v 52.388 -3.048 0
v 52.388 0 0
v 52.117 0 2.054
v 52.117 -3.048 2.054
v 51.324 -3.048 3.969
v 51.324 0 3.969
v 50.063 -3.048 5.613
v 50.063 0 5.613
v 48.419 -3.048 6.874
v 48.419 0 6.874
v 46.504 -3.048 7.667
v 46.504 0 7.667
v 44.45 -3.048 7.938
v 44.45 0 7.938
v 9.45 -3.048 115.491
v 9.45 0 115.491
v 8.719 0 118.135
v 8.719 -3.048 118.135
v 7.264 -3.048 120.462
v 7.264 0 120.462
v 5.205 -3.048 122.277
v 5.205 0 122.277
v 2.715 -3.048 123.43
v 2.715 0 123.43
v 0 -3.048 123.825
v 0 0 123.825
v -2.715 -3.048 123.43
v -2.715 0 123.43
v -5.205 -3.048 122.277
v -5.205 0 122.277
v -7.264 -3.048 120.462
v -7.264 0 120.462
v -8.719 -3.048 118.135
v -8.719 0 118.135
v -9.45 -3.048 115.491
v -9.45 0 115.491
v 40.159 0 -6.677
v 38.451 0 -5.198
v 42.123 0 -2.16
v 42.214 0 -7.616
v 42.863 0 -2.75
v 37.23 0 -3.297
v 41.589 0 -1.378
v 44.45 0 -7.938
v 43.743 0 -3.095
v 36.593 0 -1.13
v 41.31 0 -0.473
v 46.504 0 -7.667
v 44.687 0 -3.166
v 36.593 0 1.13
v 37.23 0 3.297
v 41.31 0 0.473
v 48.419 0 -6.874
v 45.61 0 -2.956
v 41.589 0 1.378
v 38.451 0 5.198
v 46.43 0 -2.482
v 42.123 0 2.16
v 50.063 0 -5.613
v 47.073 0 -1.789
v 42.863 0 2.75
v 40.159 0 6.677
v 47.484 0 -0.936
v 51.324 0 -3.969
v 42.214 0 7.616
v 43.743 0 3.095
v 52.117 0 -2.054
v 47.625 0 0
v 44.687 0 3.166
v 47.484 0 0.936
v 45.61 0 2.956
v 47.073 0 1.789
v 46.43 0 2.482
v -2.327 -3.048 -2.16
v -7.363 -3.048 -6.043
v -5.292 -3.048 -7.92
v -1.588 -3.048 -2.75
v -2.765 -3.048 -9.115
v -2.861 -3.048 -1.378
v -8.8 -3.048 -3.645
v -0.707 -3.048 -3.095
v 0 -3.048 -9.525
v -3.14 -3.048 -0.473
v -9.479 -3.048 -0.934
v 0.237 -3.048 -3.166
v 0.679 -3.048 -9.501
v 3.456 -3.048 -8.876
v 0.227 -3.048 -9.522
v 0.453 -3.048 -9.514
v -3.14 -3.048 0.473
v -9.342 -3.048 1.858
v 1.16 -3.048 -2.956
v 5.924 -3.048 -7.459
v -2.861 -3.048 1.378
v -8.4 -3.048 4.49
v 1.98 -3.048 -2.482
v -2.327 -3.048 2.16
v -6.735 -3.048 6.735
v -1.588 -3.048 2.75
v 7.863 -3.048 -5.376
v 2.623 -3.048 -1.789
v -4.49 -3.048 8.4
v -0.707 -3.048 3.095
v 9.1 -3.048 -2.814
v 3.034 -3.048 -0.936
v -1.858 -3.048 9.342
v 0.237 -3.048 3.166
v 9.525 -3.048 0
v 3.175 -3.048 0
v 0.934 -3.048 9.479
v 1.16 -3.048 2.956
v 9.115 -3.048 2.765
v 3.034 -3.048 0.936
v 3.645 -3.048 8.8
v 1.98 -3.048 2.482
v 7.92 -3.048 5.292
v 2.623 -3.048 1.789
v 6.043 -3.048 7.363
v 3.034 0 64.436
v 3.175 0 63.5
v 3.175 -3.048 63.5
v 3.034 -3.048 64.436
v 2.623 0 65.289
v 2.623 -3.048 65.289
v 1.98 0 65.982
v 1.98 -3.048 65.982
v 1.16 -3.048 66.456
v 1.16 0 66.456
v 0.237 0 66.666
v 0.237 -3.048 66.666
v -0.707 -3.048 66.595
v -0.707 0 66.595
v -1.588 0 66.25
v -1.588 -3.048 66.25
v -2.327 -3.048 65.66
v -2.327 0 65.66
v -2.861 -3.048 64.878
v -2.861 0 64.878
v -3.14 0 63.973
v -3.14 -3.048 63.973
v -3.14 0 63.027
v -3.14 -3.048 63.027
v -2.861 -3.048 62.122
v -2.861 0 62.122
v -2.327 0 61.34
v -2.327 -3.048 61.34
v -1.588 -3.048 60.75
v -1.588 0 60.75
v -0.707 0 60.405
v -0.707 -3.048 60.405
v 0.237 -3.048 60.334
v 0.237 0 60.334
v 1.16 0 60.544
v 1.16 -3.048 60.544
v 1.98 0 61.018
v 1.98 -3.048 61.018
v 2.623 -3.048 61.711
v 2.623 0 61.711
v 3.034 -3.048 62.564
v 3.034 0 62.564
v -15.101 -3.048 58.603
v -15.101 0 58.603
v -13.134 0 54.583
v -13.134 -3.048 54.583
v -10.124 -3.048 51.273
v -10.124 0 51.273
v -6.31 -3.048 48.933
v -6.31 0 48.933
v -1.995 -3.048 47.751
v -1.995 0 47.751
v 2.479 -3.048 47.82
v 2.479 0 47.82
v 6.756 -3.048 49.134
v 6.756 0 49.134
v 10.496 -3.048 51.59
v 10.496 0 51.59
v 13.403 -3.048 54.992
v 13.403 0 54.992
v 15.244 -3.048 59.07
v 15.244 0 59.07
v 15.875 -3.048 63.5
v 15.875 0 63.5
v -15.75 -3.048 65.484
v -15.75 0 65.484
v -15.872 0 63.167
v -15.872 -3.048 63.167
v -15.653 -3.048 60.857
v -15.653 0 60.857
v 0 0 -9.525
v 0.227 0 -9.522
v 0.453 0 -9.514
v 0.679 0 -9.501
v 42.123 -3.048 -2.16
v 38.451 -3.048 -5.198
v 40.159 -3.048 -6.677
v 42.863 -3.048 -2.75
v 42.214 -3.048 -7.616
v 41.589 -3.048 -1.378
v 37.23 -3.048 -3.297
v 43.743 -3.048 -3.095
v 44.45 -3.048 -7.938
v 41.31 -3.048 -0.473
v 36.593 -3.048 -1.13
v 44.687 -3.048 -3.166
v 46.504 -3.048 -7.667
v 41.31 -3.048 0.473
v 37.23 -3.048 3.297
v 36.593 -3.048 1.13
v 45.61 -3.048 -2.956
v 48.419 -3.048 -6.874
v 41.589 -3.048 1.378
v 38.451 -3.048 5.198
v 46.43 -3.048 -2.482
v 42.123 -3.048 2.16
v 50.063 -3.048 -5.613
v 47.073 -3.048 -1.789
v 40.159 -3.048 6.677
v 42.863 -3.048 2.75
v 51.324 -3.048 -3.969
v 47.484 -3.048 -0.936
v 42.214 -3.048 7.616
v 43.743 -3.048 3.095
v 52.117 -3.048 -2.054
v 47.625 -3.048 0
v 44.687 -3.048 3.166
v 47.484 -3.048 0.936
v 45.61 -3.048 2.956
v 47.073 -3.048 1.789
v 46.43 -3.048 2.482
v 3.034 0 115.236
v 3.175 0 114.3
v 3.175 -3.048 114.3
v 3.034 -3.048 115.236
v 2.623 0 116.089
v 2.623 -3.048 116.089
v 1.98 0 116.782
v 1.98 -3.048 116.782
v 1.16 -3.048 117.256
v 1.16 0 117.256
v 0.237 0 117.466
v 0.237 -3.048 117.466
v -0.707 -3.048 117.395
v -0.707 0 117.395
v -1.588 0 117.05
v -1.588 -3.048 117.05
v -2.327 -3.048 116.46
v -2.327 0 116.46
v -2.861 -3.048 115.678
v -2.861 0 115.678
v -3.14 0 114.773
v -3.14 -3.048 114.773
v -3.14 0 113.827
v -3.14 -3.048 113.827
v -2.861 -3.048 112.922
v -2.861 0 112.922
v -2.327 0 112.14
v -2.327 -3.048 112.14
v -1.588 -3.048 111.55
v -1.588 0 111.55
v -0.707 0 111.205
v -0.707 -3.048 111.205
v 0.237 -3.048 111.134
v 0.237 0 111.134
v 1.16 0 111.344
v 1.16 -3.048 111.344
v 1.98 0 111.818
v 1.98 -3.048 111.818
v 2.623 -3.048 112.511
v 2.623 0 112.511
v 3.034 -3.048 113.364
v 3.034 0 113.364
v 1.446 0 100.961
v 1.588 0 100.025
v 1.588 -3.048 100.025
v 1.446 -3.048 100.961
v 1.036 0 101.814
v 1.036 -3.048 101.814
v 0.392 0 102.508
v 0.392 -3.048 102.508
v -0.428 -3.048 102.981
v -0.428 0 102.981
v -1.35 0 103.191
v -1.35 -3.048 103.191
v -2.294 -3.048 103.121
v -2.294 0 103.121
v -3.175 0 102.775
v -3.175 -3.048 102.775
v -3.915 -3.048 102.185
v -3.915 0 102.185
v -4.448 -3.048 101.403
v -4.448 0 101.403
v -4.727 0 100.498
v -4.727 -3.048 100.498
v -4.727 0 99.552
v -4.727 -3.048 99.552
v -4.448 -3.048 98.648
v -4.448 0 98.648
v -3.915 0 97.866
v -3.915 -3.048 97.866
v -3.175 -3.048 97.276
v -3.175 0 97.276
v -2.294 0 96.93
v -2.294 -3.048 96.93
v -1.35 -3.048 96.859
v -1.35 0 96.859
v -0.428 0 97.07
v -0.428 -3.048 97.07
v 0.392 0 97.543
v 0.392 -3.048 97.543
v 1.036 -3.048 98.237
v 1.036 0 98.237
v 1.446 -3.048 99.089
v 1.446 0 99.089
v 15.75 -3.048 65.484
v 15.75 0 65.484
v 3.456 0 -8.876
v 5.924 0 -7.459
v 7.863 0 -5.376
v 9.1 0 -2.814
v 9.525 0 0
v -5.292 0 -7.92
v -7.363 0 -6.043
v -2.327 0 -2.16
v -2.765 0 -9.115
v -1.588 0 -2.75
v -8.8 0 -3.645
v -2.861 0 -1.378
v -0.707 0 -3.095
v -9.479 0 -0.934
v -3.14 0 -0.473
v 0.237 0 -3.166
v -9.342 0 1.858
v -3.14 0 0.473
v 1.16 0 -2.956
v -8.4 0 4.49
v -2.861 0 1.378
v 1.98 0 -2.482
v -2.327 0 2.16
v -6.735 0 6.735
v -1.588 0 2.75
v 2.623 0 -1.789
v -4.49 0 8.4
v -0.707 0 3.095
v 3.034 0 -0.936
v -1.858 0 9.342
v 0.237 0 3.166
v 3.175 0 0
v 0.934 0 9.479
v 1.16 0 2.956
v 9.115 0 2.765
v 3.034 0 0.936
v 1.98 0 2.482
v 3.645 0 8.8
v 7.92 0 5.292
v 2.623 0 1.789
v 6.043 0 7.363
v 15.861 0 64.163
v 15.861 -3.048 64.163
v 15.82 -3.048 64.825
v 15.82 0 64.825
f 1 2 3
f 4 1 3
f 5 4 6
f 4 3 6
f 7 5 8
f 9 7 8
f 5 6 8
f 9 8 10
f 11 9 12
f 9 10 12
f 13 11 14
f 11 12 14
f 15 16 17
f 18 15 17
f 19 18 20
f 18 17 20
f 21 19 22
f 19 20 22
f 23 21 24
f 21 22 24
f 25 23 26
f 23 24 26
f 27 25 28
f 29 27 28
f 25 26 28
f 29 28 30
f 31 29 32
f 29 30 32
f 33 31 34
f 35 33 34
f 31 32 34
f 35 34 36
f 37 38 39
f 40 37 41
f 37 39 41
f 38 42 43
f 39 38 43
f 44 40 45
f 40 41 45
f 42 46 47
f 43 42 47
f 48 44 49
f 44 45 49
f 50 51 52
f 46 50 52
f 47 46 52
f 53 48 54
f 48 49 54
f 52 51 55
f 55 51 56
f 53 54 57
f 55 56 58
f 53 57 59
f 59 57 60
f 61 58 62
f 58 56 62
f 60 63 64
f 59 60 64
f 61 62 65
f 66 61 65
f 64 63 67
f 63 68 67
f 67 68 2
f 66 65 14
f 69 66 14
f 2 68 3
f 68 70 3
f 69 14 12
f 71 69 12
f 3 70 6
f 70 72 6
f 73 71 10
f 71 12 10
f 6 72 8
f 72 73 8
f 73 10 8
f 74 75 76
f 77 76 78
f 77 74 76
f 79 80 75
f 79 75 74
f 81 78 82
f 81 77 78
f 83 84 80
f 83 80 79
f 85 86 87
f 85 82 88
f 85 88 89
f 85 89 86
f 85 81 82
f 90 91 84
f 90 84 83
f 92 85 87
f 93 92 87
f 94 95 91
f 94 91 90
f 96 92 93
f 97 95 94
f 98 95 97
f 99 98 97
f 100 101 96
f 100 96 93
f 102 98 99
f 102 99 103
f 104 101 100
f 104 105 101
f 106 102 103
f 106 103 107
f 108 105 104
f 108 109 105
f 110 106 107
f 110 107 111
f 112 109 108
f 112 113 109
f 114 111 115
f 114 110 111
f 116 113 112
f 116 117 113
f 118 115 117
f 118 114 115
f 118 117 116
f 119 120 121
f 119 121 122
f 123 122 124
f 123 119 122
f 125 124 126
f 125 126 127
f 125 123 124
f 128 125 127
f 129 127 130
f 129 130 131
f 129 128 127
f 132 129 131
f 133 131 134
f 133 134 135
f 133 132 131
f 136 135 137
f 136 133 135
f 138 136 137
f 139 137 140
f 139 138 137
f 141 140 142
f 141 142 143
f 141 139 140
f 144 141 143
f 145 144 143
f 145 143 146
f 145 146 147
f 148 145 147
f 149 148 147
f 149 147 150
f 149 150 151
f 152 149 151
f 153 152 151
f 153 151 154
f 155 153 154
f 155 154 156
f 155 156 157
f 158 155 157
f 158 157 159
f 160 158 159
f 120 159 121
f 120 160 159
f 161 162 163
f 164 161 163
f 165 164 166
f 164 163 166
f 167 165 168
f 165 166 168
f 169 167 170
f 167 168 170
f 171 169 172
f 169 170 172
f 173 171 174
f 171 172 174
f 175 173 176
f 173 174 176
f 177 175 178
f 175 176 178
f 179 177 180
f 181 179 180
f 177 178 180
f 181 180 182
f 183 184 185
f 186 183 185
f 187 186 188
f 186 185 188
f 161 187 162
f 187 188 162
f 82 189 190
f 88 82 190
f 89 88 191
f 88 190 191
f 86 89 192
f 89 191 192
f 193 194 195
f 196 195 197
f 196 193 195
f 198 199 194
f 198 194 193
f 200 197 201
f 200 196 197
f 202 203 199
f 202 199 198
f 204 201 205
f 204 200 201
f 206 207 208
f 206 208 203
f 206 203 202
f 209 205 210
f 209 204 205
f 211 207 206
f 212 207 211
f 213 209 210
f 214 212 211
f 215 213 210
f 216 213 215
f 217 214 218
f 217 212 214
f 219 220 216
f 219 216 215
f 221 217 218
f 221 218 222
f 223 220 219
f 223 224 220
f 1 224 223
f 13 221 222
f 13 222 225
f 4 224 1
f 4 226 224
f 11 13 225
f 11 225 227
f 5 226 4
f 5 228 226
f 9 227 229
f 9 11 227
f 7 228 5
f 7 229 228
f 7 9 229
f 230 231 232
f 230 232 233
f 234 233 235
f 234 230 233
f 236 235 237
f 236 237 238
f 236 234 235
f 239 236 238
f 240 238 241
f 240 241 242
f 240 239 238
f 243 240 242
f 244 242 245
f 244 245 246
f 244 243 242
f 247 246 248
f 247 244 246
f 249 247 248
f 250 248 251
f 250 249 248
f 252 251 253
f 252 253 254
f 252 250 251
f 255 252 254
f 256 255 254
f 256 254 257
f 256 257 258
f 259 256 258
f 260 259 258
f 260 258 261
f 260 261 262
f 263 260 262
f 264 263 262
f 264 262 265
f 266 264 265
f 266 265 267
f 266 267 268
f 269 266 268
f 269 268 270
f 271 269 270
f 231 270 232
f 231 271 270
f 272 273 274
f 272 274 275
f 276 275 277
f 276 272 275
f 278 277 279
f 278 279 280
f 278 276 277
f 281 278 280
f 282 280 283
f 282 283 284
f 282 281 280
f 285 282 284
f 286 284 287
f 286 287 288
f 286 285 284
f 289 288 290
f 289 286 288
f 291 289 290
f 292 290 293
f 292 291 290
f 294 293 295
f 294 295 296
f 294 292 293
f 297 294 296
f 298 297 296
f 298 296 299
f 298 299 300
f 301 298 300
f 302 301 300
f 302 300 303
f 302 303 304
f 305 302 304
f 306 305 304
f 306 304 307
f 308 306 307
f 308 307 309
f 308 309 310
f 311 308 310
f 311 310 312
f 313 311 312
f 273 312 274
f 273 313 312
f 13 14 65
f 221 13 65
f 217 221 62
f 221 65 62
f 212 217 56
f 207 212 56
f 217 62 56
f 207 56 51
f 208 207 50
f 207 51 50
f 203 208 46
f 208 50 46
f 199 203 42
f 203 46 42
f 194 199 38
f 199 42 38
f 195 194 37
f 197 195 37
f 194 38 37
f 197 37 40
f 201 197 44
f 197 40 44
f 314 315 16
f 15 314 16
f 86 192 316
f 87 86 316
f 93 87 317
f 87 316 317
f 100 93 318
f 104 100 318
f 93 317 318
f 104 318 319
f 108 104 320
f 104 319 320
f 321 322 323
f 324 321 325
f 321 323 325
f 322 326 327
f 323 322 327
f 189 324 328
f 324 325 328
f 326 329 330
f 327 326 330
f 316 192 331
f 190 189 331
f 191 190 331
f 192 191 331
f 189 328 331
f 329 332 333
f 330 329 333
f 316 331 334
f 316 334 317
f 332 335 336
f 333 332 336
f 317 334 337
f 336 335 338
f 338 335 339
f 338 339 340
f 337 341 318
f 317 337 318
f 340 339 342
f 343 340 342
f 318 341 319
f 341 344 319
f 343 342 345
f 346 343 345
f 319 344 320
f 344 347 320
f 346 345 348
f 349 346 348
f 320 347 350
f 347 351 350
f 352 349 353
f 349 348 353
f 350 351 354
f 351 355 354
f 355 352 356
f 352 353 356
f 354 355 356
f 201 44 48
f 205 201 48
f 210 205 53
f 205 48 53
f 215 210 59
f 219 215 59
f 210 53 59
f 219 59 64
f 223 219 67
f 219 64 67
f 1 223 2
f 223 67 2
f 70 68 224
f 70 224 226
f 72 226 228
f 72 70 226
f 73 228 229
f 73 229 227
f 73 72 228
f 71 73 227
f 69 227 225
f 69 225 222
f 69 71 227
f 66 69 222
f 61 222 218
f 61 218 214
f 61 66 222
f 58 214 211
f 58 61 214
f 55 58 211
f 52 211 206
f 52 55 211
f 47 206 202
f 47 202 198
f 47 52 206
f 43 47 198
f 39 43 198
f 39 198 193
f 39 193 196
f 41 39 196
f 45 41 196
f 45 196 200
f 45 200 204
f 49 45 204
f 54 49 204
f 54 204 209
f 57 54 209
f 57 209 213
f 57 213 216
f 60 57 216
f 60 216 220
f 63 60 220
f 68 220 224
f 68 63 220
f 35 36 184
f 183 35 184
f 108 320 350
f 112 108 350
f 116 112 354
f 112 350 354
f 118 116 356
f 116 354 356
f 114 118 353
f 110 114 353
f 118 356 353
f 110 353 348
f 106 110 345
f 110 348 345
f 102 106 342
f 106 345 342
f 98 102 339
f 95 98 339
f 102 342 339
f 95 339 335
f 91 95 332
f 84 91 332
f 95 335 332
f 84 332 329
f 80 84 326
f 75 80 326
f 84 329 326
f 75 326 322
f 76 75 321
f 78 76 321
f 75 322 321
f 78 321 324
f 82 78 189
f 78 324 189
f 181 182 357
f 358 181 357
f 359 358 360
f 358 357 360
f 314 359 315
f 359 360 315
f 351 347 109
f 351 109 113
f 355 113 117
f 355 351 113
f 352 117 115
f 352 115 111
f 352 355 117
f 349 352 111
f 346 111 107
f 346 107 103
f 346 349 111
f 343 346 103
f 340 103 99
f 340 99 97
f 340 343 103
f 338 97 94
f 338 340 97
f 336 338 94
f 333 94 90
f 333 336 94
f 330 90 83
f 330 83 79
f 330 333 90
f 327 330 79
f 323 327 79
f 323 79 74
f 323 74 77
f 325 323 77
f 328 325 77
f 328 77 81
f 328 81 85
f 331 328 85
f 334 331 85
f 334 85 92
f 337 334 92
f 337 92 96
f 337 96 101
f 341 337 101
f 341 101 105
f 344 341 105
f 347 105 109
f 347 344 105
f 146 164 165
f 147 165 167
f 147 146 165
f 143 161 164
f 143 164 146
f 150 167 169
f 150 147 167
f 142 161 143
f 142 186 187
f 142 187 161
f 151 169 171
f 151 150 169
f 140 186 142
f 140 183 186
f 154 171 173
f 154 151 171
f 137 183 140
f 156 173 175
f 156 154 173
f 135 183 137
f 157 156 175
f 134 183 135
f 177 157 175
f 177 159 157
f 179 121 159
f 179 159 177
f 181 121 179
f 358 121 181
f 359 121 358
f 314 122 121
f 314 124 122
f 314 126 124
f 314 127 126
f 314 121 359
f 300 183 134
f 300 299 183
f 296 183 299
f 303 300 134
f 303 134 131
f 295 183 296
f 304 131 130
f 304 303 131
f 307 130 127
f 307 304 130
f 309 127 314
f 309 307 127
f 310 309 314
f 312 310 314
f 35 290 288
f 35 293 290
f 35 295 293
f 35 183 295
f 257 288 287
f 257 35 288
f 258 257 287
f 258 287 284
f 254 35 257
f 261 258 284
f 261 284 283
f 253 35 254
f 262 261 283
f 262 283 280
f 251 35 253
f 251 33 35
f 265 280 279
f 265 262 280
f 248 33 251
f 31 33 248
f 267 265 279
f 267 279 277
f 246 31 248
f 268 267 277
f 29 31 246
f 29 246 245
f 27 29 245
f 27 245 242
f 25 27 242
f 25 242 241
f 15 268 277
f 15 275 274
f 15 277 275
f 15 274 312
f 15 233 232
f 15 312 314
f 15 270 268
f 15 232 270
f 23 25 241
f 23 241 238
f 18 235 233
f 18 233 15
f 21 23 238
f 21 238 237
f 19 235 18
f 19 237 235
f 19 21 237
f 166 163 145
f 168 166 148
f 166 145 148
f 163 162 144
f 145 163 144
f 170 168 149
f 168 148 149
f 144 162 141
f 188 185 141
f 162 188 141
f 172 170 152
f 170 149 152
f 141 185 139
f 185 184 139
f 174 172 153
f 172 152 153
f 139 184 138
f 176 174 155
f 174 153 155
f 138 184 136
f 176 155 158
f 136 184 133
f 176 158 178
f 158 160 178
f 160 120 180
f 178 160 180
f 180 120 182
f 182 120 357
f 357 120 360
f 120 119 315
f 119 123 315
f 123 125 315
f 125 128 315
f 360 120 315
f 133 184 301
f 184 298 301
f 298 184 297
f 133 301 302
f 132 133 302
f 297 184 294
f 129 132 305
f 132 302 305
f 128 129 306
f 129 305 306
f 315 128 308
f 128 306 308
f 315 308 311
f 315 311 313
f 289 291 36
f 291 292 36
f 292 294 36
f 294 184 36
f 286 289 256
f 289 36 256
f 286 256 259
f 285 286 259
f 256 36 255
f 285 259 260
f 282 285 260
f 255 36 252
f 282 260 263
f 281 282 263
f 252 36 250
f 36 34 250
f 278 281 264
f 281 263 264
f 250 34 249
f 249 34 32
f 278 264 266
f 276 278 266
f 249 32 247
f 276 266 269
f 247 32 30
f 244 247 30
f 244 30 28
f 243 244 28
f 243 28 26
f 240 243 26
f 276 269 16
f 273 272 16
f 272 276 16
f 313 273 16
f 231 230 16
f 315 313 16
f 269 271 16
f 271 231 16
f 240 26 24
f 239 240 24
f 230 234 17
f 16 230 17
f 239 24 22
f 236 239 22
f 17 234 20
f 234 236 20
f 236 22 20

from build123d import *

# Parameters (mm, degrees)
F0_R     = 3.175
F1_DEPTH = 3.048


with BuildPart() as f1:
    # F0 (on Front) → F1 (new body)
    with BuildSketch(Plane.XZ):
        with BuildLine():
            ThreePointArc((0.67949, -9.500732), (6.97129, -6.490511), (9.525, 0))
            ThreePointArc((9.525, 0), (-6.735192, 6.735192), (0, -9.525))
            Line((0, -9.525), (0.67949, -9.500732))
        make_face()
        Circle(F0_R, mode=Mode.SUBTRACT)
        with BuildLine():
            ThreePointArc((-15.100703, 58.602614), (2.479109, 47.819769), (15.875, 63.5))
            ThreePointArc((15.875, 63.5), (15.843841, 64.494139), (15.750488, 65.484375))
            ThreePointArc((15.750488, 65.484375), (0, 79.375), (-15.750488, 65.484375))
            Line((-15.750488, 65.484375), (-15.100703, 58.602614))
        make_face()
        with Locations((0, 63.5)):
            Circle(F0_R, mode=Mode.SUBTRACT)
        with BuildLine():
            ThreePointArc((44.45, 7.9375), (36.5125, 0), (44.45, -7.9375))
            ThreePointArc((44.45, -7.9375), (50.06266, -5.61266), (52.3875, 0))
            ThreePointArc((52.3875, 0), (50.06266, 5.61266), (44.45, 7.9375))
        make_face()
        with Locations((44.45, 0)):
            Circle(F0_R, mode=Mode.SUBTRACT)
        with BuildLine():
            Line((0.67949, -9.500732), (0, -9.525))
            ThreePointArc((0, -9.525), (0.339962, -9.518931), (0.67949, -9.500732))
        make_face()
        with BuildLine():
            ThreePointArc((-15.750488, 65.484375), (0, 79.375), (15.750488, 65.484375))
            Line((15.750488, 65.484375), (9.450293, 115.490625))
            ThreePointArc((9.450293, 115.490625), (9.506305, 114.896483), (9.525, 114.3))
            ThreePointArc((9.525, 114.3), (-0.596483, 104.793695), (-9.450293, 115.490625))
            Line((-9.450293, 115.490625), (-15.750488, 65.484375))
        make_face()
        with Locations((-1.5875, 100.0252)):
            Circle(F0_R, mode=Mode.SUBTRACT)
        with BuildLine():
            ThreePointArc((-15.750488, 65.484375), (-15.804704, 62.007699), (-15.100703, 58.602614))
            Line((-15.100703, 58.602614), (-15.750488, 65.484375))
        make_face()
        with BuildLine():
            ThreePointArc((9.525, 114.3), (9.506305, 114.896483), (9.450293, 115.490625))
            ThreePointArc((9.450293, 115.490625), (0, 123.825), (-9.450293, 115.490625))
            ThreePointArc((-9.450293, 115.490625), (-0.596483, 104.793695), (9.525, 114.3))
        make_face()
        with Locations((0, 114.3)):
            Circle(F0_R, mode=Mode.SUBTRACT)
    extrude(amount=F1_DEPTH)


solid = f1.part
